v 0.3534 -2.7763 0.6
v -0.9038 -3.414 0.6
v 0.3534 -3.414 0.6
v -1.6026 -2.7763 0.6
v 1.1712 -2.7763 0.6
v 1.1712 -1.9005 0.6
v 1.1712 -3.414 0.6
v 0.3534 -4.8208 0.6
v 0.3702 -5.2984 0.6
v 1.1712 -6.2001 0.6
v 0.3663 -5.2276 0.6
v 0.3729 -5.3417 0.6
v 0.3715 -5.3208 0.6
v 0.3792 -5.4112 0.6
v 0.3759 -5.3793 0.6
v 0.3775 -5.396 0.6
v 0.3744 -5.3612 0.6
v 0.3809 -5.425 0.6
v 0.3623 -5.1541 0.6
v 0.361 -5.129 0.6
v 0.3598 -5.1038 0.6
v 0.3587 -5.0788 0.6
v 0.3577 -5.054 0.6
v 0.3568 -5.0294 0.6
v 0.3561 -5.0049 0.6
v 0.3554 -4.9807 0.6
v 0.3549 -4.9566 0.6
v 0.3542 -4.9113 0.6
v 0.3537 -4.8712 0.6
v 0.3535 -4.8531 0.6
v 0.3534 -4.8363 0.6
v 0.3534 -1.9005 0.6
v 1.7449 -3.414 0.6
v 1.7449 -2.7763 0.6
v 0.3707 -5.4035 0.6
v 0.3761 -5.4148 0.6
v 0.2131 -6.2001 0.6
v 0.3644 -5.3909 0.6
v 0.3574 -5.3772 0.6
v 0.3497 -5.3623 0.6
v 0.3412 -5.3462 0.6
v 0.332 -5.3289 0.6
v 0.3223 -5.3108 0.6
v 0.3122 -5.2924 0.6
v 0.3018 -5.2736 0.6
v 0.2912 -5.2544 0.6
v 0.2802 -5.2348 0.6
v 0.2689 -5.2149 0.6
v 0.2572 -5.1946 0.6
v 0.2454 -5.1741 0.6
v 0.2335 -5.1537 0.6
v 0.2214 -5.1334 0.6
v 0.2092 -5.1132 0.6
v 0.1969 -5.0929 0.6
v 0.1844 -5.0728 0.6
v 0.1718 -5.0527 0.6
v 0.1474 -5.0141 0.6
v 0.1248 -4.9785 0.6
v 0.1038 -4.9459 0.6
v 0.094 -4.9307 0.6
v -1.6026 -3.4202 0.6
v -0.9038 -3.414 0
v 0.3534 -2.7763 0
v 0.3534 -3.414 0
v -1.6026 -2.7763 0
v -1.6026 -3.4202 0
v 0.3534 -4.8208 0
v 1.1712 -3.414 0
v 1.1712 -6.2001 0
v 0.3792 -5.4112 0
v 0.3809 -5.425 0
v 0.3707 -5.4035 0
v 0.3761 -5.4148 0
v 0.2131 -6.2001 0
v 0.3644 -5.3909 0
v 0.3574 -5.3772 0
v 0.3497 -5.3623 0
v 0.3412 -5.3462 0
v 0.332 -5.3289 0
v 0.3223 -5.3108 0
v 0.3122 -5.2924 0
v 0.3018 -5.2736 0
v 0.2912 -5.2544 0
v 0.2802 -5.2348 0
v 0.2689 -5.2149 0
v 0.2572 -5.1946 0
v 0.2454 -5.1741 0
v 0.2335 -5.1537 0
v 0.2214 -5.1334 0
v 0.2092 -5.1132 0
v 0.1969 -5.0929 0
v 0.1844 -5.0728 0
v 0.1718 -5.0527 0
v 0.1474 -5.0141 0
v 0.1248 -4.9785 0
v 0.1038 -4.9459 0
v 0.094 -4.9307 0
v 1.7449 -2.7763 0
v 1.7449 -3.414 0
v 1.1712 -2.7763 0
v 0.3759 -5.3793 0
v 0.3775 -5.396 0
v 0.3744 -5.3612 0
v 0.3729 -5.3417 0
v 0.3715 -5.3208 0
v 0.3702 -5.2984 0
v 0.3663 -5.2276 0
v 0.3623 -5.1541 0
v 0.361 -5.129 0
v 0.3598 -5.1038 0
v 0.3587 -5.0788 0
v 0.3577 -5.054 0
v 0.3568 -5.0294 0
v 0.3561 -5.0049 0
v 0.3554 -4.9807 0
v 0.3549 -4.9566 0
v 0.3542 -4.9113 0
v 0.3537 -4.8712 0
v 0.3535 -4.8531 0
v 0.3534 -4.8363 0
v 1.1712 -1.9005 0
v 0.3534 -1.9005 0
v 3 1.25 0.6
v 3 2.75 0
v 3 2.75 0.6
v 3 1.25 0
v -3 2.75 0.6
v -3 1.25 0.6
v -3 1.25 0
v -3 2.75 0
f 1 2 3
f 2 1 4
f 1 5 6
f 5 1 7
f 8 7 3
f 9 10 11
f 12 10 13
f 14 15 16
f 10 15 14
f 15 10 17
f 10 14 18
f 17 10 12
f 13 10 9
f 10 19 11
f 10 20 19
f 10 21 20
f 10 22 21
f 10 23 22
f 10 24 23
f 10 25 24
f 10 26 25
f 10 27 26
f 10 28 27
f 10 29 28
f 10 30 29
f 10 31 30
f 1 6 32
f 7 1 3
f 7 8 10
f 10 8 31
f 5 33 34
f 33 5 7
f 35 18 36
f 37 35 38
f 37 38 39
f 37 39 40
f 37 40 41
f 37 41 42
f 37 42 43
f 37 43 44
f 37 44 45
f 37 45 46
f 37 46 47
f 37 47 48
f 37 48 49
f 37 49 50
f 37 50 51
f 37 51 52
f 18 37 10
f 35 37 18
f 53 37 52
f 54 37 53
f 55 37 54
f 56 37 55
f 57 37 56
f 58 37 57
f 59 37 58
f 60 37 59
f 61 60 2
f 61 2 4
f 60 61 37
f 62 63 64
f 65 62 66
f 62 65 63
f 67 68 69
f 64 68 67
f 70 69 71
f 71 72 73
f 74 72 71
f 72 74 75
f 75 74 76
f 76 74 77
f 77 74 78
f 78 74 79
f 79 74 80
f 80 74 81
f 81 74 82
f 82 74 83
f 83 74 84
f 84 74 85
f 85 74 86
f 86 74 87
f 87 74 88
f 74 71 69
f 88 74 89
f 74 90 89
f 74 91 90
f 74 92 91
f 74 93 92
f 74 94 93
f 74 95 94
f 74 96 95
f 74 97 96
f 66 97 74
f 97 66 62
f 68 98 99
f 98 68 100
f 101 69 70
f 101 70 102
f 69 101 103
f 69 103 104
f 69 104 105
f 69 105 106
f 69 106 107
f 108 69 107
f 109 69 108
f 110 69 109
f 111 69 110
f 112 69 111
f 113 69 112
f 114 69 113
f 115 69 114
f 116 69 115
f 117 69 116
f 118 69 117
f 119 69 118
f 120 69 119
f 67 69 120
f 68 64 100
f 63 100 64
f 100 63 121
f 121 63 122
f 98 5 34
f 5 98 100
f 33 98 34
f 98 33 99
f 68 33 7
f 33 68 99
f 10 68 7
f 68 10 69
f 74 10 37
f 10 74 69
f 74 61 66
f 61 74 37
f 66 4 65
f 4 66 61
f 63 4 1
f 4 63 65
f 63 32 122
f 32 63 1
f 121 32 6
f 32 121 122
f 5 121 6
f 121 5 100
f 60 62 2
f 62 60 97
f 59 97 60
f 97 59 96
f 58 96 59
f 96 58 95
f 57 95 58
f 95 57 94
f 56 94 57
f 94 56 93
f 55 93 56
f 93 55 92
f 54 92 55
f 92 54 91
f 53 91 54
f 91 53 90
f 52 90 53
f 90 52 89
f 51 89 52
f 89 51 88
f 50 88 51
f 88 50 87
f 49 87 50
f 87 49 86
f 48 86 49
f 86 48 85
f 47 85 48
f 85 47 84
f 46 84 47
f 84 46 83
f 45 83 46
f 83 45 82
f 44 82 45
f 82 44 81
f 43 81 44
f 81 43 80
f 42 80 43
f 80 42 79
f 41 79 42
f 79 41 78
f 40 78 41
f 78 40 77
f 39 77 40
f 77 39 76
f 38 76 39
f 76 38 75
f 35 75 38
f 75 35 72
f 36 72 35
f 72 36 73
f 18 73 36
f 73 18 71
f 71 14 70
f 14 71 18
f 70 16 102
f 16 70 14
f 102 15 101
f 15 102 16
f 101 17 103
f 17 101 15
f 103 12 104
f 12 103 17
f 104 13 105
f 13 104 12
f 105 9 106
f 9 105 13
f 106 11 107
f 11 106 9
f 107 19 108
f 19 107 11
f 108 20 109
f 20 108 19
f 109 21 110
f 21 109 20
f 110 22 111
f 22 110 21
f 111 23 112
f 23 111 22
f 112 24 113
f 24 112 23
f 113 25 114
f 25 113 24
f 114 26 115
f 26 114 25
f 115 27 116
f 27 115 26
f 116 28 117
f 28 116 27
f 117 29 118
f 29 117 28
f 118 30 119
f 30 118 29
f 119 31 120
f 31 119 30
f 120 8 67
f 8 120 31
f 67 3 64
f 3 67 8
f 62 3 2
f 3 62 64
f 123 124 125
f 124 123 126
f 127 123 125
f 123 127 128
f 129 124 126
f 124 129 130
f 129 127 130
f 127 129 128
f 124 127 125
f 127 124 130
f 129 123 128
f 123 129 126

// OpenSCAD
$fn = 50;

difference() {
	union() {
		translate(v = [0.0, -4.0, 0.6]) {
			rotate(a = [180, 0, 0]) {
				linear_extrude(height = 0.6) {
					text(font = "Liberation Sans:style=Bold", halign = "center", size = 4.5, text = "4", valign = "center");
				}
			}
		}
		translate(v = [-3.0, 1.25, 0]) {
			cube(size = [6, 1.5, 0.6]);
		}
	}
	union();
}
